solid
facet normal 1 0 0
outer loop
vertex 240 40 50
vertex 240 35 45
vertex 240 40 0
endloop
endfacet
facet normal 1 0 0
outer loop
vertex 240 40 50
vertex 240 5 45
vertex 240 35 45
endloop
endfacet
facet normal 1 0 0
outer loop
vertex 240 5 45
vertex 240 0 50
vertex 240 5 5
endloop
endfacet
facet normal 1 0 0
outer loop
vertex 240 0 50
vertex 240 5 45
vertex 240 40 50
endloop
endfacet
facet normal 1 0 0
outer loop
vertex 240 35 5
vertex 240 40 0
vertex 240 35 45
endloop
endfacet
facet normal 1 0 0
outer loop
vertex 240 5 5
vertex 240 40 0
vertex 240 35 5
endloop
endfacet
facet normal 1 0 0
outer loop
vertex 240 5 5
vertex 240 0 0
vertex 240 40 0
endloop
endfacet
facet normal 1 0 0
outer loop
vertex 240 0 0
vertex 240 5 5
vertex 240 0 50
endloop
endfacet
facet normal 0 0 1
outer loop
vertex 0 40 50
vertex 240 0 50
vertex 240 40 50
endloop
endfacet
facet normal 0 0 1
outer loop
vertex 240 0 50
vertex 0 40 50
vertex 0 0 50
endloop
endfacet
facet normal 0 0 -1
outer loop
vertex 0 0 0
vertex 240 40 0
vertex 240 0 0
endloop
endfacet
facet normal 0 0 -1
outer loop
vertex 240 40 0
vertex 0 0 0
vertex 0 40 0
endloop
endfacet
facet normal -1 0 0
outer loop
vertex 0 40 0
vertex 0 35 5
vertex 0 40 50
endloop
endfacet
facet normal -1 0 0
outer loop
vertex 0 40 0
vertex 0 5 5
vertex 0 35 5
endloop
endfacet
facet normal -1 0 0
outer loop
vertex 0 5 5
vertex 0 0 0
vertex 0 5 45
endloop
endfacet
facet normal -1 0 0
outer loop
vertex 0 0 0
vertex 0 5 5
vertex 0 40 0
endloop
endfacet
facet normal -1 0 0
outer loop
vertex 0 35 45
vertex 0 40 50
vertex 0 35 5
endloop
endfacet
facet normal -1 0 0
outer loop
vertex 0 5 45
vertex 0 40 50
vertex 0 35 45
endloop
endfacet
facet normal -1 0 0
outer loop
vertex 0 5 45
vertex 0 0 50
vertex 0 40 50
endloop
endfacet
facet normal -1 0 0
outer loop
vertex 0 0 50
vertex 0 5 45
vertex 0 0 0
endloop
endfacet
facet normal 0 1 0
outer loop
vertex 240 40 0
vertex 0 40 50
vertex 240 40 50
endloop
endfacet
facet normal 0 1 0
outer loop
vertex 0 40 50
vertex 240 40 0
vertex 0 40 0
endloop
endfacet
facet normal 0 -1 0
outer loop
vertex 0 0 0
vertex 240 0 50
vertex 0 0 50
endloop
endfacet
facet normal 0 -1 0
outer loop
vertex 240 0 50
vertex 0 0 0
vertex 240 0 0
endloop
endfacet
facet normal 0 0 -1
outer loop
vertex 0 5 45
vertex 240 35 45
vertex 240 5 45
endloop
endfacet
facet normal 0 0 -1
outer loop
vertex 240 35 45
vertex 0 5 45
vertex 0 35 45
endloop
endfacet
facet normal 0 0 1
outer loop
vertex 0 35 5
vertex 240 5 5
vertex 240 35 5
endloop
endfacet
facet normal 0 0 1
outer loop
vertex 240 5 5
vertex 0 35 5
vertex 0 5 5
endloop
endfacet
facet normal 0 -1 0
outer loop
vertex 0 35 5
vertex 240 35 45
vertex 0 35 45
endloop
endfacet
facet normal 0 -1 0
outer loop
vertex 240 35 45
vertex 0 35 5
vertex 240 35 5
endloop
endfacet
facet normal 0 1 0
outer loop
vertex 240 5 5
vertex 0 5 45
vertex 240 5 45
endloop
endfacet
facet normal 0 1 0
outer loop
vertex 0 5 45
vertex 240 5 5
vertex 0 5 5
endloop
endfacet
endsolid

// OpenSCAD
$fn = 32;

// ----------------------------------------------------------------------
// Box beam: 200-250 mm hollow beam
// ----------------------------------------------------------------------

// --- parameters (mm) ---
beam_l = 240;             // beam length, X
beam_w = 40;              // beam width, Y
beam_h = 50;              // beam height, Z
wall = 5;                 // wall thickness
fit_tol = 0.02;           // tolerance for press fits, mm
free_tol = 0.2;           // tolerance for clearance fits, mm

difference() {
  cube([beam_l, beam_w, beam_h]);
  translate([-1, wall, wall])
    cube([beam_l + 2, beam_w - 2 * wall, beam_h - 2 * wall]);
}
